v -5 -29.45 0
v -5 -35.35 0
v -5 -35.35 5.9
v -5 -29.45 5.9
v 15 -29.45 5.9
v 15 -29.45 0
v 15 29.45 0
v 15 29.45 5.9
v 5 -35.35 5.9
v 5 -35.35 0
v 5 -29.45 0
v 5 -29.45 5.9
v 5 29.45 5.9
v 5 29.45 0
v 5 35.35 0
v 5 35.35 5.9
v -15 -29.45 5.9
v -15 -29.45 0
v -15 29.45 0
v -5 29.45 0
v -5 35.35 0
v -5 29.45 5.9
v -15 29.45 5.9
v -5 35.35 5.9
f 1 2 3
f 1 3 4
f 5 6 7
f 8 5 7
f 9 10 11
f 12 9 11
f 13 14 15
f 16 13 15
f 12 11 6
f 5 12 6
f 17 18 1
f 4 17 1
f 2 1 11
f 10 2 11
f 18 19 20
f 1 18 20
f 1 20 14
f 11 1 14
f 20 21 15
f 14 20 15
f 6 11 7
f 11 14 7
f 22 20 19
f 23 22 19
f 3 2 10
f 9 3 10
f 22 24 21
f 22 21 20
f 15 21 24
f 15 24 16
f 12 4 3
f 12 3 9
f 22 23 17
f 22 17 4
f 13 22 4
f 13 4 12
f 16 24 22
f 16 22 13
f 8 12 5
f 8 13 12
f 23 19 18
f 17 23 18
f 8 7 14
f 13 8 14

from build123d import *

# Parameters (mm, degrees)
SKETCH1_W           = 10
SKETCH1_H           = 5.9
BOSS_EXTRUDE1_DEPTH = 5.9


with BuildPart() as part:
    # Sketch1 → Boss-Extrude1 (new body)
    with BuildSketch(Plane.XY):
        with Locations((0, 32.4)):
            Rectangle(SKETCH1_W, SKETCH1_H)
        with Locations((0, 26.5)):
            Rectangle(SKETCH1_W, SKETCH1_H)
        Polygon((-15, 29.45), (-15, -29.45), (-5, -29.45), (-5, -23.55), (5, -23.55), (5, -29.45), (15, -29.45), (15, 29.45), (5, 29.45), (5, 23.55), (-5, 23.55), (-5, 29.45), align=None)
        with Locations((0, -26.5)):
            Rectangle(SKETCH1_W, SKETCH1_H)
        with Locations((0, -32.4)):
            Rectangle(SKETCH1_W, SKETCH1_H)
    extrude(amount=BOSS_EXTRUDE1_DEPTH)


solid = part.part
